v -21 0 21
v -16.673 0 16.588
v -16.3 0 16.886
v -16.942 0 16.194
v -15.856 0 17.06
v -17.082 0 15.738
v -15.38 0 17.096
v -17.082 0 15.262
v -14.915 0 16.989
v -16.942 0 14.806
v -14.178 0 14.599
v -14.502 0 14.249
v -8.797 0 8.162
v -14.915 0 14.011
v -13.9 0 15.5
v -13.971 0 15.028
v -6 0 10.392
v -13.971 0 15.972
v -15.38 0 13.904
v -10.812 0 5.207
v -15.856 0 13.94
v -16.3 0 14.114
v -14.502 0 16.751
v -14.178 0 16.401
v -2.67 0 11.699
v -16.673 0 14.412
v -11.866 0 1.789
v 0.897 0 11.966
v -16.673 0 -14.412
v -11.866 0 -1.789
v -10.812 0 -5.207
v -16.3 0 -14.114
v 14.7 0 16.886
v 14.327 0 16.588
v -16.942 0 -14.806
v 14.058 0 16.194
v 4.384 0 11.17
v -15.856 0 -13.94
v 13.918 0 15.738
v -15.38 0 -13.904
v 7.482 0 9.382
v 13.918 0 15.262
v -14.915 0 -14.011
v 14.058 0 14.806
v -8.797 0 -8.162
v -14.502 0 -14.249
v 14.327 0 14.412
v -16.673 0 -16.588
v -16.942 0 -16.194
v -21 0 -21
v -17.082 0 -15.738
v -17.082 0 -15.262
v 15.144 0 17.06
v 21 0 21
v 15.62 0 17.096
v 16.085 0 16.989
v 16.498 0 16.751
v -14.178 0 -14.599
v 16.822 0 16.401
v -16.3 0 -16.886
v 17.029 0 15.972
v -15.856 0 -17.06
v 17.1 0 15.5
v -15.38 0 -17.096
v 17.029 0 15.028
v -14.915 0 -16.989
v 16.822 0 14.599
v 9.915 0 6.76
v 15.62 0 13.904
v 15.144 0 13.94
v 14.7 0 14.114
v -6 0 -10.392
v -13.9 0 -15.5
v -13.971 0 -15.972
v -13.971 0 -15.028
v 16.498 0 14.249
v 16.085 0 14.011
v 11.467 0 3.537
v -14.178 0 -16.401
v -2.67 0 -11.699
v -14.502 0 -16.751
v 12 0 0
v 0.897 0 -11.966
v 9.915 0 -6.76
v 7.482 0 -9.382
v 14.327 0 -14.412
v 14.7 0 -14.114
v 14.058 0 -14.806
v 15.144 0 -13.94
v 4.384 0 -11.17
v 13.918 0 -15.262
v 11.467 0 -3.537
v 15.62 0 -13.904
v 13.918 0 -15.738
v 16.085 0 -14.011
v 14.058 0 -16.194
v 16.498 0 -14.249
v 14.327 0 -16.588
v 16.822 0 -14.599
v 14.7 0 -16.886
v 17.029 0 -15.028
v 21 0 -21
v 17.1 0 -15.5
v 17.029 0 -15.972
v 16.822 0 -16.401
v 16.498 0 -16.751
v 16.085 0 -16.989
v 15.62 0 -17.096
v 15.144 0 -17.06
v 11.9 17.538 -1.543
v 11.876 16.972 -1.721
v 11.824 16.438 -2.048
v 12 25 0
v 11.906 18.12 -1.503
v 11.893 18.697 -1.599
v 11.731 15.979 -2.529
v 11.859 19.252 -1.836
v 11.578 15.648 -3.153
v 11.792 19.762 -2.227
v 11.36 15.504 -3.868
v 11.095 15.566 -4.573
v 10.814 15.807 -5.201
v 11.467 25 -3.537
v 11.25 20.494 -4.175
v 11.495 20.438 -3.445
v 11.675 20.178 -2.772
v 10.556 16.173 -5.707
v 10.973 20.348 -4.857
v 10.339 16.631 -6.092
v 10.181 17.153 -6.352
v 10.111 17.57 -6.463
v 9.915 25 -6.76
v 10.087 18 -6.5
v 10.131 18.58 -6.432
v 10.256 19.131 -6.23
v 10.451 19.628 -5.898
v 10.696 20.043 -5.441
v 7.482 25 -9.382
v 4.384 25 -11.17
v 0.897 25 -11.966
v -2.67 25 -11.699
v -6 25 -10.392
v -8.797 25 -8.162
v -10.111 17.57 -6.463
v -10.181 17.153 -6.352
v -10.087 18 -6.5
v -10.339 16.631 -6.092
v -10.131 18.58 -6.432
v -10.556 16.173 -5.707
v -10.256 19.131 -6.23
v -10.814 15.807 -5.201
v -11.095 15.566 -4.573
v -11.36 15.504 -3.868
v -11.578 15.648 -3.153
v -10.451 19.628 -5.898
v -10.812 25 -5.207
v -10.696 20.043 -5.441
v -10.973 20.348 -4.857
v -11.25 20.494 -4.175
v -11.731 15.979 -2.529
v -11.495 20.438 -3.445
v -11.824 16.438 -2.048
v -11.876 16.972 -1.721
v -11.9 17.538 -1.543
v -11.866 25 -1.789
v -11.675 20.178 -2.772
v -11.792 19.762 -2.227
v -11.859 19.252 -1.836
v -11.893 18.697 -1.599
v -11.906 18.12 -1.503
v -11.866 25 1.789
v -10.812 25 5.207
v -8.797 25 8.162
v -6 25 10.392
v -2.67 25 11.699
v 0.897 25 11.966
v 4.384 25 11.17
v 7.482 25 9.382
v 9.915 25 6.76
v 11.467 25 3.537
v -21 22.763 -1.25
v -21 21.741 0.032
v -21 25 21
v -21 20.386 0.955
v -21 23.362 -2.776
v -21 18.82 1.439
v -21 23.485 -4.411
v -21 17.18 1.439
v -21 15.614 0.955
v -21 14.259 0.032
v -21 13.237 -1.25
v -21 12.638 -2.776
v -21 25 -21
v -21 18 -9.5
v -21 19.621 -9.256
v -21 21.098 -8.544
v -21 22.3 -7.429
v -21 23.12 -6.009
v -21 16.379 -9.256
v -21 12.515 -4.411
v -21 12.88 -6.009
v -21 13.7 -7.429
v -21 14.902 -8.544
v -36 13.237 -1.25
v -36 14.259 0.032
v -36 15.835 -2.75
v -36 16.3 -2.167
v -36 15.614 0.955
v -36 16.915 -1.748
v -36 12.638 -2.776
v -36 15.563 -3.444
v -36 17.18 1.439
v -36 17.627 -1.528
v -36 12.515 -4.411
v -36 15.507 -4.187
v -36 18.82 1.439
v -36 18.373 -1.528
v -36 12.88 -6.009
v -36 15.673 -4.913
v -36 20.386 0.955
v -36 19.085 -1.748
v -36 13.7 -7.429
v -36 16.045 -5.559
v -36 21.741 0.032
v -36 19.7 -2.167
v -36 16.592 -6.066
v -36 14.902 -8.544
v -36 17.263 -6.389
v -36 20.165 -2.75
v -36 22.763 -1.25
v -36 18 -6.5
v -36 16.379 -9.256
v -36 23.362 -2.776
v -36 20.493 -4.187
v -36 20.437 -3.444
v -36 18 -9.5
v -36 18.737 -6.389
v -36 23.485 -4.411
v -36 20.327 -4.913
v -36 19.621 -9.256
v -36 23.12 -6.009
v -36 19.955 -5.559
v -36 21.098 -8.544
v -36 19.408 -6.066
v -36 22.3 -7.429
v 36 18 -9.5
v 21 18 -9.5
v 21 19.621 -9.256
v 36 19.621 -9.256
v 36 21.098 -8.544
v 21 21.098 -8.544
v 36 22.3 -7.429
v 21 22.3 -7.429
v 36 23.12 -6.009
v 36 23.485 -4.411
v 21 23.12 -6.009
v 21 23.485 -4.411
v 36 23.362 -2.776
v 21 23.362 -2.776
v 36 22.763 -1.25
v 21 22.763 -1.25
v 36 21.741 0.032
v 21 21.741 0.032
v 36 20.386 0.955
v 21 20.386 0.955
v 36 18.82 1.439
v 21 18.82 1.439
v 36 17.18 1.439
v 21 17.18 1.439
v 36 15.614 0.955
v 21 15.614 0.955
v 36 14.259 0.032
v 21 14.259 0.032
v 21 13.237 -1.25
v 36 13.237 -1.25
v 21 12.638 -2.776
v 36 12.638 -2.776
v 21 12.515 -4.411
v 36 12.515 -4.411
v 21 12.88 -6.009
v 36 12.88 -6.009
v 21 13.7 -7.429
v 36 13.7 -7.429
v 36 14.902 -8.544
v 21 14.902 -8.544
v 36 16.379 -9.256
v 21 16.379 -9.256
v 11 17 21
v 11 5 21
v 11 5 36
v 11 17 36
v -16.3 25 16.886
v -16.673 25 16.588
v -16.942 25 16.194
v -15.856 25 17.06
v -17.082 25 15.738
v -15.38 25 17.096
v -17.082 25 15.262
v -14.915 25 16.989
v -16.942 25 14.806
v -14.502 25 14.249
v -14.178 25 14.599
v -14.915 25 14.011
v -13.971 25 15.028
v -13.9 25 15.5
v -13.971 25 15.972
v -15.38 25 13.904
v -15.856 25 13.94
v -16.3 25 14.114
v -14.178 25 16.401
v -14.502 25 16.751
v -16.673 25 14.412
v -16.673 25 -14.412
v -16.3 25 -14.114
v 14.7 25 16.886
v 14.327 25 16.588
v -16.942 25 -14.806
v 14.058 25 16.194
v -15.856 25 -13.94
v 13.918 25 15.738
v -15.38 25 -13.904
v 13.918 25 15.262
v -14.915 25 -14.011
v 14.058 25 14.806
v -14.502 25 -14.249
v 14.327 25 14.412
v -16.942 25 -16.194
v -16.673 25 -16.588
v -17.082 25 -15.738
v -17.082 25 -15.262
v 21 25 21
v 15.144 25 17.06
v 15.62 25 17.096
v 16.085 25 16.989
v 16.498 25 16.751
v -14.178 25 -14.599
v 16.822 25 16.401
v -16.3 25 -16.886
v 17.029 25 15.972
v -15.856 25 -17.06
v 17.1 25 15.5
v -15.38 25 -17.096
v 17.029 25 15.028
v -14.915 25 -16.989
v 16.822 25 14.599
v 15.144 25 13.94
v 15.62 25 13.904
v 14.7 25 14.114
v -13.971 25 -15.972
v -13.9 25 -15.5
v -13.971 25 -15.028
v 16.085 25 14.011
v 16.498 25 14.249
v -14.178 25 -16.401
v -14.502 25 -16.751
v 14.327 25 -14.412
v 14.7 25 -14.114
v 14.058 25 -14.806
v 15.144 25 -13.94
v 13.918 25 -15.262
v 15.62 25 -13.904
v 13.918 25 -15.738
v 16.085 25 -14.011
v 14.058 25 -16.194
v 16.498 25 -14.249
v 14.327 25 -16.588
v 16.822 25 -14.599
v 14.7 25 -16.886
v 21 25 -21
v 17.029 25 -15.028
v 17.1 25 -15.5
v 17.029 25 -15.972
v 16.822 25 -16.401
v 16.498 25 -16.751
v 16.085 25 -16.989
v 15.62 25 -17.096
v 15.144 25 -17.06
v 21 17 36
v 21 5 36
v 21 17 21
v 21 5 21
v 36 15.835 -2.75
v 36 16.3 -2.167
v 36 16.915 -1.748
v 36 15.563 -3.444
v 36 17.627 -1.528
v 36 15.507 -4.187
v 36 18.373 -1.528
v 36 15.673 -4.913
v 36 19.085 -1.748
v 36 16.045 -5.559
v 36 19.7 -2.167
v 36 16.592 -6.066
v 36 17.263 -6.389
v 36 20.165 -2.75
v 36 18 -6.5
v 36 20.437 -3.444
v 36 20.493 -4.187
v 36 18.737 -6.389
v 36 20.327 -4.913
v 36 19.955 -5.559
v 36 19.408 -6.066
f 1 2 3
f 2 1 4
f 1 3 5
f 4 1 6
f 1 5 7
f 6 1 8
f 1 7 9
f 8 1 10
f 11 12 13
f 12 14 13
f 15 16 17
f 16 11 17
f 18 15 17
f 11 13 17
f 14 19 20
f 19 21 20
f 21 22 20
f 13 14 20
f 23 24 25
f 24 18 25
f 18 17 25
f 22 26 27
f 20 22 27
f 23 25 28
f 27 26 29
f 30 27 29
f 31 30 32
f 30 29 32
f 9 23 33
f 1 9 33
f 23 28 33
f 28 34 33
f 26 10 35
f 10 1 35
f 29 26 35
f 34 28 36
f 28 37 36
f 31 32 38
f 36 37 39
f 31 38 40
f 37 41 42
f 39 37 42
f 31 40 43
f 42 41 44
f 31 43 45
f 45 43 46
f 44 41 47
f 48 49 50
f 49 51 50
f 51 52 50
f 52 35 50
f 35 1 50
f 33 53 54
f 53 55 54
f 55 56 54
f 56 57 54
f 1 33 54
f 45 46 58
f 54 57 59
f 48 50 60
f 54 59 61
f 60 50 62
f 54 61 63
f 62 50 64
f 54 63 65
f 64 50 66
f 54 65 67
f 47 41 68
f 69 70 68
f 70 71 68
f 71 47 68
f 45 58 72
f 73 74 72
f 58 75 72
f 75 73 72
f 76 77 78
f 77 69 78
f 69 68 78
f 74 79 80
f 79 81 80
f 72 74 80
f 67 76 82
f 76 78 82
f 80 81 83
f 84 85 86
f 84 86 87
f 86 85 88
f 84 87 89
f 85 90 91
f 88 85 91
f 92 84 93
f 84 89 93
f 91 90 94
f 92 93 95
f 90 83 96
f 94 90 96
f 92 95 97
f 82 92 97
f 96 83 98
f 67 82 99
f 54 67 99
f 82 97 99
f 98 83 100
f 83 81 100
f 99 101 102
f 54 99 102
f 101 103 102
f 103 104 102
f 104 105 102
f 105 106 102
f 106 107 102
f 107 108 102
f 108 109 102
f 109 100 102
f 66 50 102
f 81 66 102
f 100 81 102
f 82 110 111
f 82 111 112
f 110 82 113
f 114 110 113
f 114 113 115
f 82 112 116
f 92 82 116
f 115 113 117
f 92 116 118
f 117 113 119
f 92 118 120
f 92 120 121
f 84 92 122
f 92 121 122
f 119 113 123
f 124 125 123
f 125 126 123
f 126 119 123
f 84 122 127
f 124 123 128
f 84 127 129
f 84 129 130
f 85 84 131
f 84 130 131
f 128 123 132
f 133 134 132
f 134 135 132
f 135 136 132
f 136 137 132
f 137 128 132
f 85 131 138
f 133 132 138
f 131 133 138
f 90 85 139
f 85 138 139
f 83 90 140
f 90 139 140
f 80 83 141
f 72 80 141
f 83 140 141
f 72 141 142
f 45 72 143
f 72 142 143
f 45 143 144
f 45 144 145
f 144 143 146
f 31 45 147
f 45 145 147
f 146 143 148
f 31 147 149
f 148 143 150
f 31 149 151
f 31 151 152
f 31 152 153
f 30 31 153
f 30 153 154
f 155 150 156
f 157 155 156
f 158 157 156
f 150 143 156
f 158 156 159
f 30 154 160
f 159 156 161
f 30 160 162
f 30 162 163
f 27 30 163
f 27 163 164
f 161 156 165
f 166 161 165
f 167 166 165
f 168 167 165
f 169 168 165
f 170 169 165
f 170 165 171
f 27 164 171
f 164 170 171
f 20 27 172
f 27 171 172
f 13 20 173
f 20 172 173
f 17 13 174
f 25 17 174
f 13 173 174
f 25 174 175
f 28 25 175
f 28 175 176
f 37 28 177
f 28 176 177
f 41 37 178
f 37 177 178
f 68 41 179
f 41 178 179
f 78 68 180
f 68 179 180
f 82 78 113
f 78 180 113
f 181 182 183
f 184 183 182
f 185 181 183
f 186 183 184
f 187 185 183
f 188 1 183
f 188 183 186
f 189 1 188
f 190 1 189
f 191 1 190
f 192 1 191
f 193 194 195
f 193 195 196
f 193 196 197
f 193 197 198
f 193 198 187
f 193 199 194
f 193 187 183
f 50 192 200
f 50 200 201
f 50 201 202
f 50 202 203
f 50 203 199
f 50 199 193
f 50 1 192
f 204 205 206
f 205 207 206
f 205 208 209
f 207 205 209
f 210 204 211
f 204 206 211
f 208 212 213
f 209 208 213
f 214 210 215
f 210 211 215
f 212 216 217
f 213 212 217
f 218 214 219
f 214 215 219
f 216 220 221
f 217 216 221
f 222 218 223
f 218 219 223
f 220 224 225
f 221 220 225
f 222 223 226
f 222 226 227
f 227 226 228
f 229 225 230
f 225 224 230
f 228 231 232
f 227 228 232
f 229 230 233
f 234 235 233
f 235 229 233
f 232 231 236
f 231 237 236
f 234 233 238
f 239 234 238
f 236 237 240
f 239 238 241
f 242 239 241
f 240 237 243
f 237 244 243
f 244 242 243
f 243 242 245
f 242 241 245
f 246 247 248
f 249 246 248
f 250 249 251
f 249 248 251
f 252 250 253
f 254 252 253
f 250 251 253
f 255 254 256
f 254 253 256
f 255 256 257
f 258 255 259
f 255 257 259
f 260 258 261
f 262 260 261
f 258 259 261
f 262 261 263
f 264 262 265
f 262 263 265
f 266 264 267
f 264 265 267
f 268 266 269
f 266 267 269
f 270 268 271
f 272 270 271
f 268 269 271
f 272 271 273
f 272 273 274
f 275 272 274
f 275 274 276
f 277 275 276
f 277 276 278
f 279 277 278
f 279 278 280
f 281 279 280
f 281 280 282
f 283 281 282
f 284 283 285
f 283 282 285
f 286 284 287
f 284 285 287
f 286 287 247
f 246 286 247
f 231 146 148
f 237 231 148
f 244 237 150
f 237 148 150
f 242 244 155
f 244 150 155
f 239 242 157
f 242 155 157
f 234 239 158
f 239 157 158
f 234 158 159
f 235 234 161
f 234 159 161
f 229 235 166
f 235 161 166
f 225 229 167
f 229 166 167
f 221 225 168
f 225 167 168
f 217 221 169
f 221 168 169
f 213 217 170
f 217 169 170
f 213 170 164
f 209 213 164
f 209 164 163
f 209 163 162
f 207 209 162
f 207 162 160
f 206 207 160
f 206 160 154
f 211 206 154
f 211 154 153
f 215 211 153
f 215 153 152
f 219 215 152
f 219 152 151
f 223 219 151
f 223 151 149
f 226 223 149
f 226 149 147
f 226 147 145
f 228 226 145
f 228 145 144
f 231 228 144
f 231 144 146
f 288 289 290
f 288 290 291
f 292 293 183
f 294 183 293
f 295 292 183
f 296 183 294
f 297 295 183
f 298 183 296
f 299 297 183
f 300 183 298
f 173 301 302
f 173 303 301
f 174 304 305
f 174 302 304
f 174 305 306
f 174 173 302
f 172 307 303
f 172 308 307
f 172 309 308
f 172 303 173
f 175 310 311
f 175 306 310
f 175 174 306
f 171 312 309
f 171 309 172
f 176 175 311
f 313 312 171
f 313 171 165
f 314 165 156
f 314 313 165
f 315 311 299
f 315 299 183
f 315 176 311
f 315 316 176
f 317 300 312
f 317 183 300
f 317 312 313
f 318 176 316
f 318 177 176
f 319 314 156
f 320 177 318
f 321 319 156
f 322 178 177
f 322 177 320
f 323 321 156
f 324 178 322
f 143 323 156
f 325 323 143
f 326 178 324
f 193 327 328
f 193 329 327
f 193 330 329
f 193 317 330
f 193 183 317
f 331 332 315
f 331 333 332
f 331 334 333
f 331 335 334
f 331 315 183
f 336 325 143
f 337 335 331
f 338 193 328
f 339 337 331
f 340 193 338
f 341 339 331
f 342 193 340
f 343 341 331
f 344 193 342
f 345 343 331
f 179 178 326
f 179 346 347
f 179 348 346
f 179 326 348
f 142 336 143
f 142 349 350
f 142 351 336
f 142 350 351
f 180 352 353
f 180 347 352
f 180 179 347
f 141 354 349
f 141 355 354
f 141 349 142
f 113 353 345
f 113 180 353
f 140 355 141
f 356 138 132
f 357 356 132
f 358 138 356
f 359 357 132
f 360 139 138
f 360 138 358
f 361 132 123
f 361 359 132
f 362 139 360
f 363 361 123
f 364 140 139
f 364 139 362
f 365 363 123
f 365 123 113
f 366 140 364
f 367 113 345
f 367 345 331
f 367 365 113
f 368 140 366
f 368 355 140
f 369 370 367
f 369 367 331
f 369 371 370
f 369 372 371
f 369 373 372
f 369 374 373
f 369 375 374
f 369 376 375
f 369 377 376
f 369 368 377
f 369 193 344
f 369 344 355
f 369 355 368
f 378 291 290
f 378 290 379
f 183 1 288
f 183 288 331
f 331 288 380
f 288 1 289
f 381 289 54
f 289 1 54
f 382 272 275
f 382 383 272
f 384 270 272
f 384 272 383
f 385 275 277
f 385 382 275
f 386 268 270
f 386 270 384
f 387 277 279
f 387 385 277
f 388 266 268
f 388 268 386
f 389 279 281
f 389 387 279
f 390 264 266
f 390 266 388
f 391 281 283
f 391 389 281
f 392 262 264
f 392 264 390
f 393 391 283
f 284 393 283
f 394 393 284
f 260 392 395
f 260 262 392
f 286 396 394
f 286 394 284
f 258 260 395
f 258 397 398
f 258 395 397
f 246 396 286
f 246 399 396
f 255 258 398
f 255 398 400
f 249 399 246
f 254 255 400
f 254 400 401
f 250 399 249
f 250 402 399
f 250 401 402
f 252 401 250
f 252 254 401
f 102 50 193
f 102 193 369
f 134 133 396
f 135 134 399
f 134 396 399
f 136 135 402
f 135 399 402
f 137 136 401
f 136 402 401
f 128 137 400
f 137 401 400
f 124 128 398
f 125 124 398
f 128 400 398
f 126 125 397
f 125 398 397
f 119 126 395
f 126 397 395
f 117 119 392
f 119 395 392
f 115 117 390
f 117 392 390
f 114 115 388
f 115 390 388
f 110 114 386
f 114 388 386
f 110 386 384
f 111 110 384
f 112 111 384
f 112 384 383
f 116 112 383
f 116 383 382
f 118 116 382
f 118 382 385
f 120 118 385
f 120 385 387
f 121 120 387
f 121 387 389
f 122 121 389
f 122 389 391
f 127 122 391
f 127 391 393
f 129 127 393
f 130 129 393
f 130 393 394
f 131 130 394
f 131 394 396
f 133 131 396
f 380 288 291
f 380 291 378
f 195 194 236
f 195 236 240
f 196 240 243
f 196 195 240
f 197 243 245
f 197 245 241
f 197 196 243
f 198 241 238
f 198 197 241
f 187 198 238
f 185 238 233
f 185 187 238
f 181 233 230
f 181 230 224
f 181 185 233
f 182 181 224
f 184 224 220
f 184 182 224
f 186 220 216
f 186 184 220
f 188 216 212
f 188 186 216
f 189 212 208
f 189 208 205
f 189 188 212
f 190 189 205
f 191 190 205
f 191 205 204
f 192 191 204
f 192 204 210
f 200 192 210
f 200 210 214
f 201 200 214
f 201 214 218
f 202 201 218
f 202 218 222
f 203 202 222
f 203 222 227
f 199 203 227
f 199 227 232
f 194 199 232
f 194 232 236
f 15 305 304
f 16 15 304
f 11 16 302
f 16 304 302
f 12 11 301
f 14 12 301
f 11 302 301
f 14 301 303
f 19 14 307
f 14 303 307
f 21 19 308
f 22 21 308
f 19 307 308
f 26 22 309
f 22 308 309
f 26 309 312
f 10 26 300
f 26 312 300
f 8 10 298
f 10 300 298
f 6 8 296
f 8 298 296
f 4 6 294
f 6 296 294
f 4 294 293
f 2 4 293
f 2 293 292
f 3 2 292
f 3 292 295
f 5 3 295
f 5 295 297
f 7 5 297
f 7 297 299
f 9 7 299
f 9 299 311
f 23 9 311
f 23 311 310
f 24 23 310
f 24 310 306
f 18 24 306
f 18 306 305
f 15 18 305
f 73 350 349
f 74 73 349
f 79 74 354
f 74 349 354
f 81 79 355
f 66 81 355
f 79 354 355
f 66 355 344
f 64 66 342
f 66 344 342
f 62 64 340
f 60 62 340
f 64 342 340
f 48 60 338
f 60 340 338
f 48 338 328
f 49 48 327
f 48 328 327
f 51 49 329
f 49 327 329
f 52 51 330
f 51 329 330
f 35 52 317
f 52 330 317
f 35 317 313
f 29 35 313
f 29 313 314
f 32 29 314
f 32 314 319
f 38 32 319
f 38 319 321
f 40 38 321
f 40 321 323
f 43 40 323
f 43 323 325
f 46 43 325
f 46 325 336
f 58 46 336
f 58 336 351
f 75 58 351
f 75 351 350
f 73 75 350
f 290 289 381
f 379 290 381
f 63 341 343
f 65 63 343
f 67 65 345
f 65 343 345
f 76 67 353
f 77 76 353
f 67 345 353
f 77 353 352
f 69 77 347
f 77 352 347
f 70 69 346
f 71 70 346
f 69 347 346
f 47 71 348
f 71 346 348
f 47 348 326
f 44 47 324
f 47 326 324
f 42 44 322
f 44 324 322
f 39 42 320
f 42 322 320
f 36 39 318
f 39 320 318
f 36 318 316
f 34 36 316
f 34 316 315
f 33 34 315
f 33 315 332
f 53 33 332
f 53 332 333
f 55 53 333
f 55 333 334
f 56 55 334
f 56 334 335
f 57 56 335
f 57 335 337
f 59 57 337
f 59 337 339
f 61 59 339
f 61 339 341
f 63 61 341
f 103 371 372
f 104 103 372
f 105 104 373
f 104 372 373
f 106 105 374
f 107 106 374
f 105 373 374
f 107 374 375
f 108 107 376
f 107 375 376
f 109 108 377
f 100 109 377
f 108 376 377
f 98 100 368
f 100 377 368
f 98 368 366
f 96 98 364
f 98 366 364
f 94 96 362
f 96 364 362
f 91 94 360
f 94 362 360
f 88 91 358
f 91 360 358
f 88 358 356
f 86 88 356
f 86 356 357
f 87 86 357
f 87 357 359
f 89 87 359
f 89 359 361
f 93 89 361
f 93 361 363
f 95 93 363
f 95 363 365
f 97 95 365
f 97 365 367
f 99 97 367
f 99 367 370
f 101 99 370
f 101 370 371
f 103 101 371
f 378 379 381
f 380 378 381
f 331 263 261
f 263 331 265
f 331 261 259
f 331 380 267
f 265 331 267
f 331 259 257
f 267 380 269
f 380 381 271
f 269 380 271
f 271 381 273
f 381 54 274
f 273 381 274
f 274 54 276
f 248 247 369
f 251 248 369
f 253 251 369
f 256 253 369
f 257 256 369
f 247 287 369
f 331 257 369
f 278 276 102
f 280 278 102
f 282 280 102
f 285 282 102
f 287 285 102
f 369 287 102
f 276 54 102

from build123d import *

# Parameters (mm, degrees)
SKETCH_1_W           = 42
SKETCH_1_H           = 42
EXTRUDE_1_DEPTH      = 25
SKETCH_2_W           = 10
SKETCH_2_H           = 12
EXTRUDE_2_DEPTH      = 15
SKETCH_3_R           = 5.5
EXTRUDE_3_DEPTH      = 15
EXTRUDE_3_DEPTH_BACK = 57
CUT_EXTRUDE_1_REACH  = 74
SKETCH_4_R           = 2.5
CUT_EXTRUDE_2_REACH  = 27
SKETCH_5_R           = 12
SKETCH_5_R_2         = 1.6


with BuildPart() as part:
    # 草图1 → 凸台-拉伸1 (new body)
    with BuildSketch(Plane(origin=(0, 0, 0), x_dir=(1, 0, 0), z_dir=(0, 1, 0))):
        Rectangle(SKETCH_1_W, SKETCH_1_H)
    extrude(amount=EXTRUDE_1_DEPTH)

    # 草图2 → 凸台-拉伸2 (add)
    with BuildSketch(Plane.XY.offset(21)):
        with Locations((16, 11)):
            Rectangle(SKETCH_2_W, SKETCH_2_H)
    extrude(amount=EXTRUDE_2_DEPTH)

    # 草图3 → 凸台-拉伸3 (add, two sides)
    with BuildSketch(Plane(origin=(21, 0, 0), x_dir=(0, 0, -1), z_dir=(1, 0, 0))) as extrude_3_sk:
        with Locations((4, 18)):
            Circle(SKETCH_3_R)
    extrude(amount=EXTRUDE_3_DEPTH)
    extrude(extrude_3_sk.sketch, amount=-EXTRUDE_3_DEPTH_BACK)

    # 草图4 → 切除-拉伸1 (cut, up to next)
    with BuildSketch(Plane(origin=(36, 0, 0), x_dir=(0, 0, -1), z_dir=(1, 0, 0)), mode=Mode.PRIVATE) as cut_extrude_1_sk1:
        with Locations((4, 18)):
            Circle(SKETCH_4_R)
    cut_extrude_1_tool1 = extrude(cut_extrude_1_sk1.sketch, amount=-CUT_EXTRUDE_1_REACH, mode=Mode.PRIVATE) & part.part
    add(cut_extrude_1_tool1.solids().sort_by_distance((36, 18, -4))[0], mode=Mode.SUBTRACT)

    # 草图5 → 切除-拉伸2 (cut, up to next)
    with BuildSketch(Plane(origin=(0, 25, 0), x_dir=(1, 0, 0), z_dir=(0, 1, 0)), mode=Mode.PRIVATE) as cut_extrude_2_sk1:
        Circle(SKETCH_5_R)
    cut_extrude_2_tool1 = extrude(cut_extrude_2_sk1.sketch, amount=-CUT_EXTRUDE_2_REACH, mode=Mode.PRIVATE) & part.part
    add(cut_extrude_2_tool1.solids().sort_by_distance((0, 25, 0))[0], mode=Mode.SUBTRACT)
    # 草图5 → 切除-拉伸2 (cut, up to next)
    with BuildSketch(Plane(origin=(0, 25, 0), x_dir=(1, 0, 0), z_dir=(0, 1, 0)), mode=Mode.PRIVATE) as cut_extrude_2_sk2:
        with Locations((-15.5, 15.5)):
            Circle(SKETCH_5_R_2)
    cut_extrude_2_tool2 = extrude(cut_extrude_2_sk2.sketch, amount=-CUT_EXTRUDE_2_REACH, mode=Mode.PRIVATE) & part.part
    add(cut_extrude_2_tool2.solids().sort_by_distance((-15.5, 25, -15.5))[0], mode=Mode.SUBTRACT)
    # 草图5 → 切除-拉伸2 (cut, up to next)
    with BuildSketch(Plane(origin=(0, 25, 0), x_dir=(1, 0, 0), z_dir=(0, 1, 0)), mode=Mode.PRIVATE) as cut_extrude_2_sk3:
        with Locations((15.5, 15.5)):
            Circle(SKETCH_5_R_2)
    cut_extrude_2_tool3 = extrude(cut_extrude_2_sk3.sketch, amount=-CUT_EXTRUDE_2_REACH, mode=Mode.PRIVATE) & part.part
    add(cut_extrude_2_tool3.solids().sort_by_distance((15.5, 25, -15.5))[0], mode=Mode.SUBTRACT)
    # 草图5 → 切除-拉伸2 (cut, up to next)
    with BuildSketch(Plane(origin=(0, 25, 0), x_dir=(1, 0, 0), z_dir=(0, 1, 0)), mode=Mode.PRIVATE) as cut_extrude_2_sk4:
        with Locations((15.5, -15.5)):
            Circle(SKETCH_5_R_2)
    cut_extrude_2_tool4 = extrude(cut_extrude_2_sk4.sketch, amount=-CUT_EXTRUDE_2_REACH, mode=Mode.PRIVATE) & part.part
    add(cut_extrude_2_tool4.solids().sort_by_distance((15.5, 25, 15.5))[0], mode=Mode.SUBTRACT)
    # 草图5 → 切除-拉伸2 (cut, up to next)
    with BuildSketch(Plane(origin=(0, 25, 0), x_dir=(1, 0, 0), z_dir=(0, 1, 0)), mode=Mode.PRIVATE) as cut_extrude_2_sk5:
        with Locations((-15.5, -15.5)):
            Circle(SKETCH_5_R_2)
    cut_extrude_2_tool5 = extrude(cut_extrude_2_sk5.sketch, amount=-CUT_EXTRUDE_2_REACH, mode=Mode.PRIVATE) & part.part
    add(cut_extrude_2_tool5.solids().sort_by_distance((-15.5, 25, 15.5))[0], mode=Mode.SUBTRACT)


solid = part.part
